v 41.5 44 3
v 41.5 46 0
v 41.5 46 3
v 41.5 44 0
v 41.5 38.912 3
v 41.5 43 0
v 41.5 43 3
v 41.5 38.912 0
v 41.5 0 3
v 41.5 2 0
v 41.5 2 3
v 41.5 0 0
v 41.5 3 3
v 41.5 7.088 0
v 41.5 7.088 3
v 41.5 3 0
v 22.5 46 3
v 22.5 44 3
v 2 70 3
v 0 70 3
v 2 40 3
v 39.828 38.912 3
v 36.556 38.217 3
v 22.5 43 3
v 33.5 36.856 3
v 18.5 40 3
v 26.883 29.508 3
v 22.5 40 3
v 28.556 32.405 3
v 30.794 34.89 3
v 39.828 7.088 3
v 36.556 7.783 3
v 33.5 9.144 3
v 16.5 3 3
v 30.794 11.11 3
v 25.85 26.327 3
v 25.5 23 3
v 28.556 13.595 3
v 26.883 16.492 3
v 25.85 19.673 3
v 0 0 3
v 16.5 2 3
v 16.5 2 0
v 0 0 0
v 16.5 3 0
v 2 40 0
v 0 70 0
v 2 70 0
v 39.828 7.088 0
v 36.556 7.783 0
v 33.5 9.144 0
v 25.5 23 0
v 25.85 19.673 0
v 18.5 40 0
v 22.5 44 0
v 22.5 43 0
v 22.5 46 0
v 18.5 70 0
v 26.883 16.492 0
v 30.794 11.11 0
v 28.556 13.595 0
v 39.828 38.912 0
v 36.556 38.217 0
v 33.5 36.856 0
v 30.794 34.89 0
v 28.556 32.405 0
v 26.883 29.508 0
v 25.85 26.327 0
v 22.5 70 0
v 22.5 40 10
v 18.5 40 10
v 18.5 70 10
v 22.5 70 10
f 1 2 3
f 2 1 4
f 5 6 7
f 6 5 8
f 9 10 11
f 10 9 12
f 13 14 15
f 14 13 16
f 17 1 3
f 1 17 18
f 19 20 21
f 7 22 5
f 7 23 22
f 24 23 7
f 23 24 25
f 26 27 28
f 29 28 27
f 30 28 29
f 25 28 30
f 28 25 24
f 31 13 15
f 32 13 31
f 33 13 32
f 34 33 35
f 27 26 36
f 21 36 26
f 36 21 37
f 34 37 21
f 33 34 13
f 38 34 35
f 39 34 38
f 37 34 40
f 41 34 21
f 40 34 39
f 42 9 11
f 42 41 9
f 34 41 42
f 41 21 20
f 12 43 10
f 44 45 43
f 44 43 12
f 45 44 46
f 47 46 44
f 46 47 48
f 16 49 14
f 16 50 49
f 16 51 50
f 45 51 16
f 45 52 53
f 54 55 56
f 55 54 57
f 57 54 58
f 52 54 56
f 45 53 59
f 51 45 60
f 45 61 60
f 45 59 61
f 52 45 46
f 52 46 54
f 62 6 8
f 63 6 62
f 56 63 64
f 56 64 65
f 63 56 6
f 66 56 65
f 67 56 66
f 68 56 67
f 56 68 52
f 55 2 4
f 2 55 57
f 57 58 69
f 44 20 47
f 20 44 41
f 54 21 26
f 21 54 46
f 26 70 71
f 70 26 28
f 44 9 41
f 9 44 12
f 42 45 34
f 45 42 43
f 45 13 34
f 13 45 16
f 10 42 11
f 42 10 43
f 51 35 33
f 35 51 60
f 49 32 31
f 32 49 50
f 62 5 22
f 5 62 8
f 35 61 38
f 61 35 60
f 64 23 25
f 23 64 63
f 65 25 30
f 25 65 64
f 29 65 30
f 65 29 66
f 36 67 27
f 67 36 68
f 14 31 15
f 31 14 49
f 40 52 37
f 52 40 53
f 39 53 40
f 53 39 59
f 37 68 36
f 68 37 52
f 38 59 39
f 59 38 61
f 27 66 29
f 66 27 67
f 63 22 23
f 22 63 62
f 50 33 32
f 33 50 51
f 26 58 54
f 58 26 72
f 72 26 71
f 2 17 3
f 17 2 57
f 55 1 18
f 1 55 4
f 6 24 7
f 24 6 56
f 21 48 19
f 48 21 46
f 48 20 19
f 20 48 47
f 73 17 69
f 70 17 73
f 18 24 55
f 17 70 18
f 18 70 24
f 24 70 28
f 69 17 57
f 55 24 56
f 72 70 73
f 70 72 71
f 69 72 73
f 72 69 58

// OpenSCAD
// [FL_INDEX: keywords="openscad, 3d_parametric, Work_Table_Trash_Bag_Holder, csg_solid" | COT="Parametric OpenSCAD design from 3DCodeverse"]
// Title: Work Table Trash Bag Holder

//table thickness in mm
t=16.5;

translate([0,0,0])cube([2,70,3]);
difference() {
	cube([t+25,40,3]);
	translate([t,2,-1])cube([31,1,5]);
	translate([t+25,23,-1])cylinder(r=16,h=5);
}
translate([t+2,40,0]) cube([4,30,10]);
difference() {
	translate([t+2,40,0]) cube([23,6,3]);
	translate([t+5,43,-1])cube([30,1,5]);

}
